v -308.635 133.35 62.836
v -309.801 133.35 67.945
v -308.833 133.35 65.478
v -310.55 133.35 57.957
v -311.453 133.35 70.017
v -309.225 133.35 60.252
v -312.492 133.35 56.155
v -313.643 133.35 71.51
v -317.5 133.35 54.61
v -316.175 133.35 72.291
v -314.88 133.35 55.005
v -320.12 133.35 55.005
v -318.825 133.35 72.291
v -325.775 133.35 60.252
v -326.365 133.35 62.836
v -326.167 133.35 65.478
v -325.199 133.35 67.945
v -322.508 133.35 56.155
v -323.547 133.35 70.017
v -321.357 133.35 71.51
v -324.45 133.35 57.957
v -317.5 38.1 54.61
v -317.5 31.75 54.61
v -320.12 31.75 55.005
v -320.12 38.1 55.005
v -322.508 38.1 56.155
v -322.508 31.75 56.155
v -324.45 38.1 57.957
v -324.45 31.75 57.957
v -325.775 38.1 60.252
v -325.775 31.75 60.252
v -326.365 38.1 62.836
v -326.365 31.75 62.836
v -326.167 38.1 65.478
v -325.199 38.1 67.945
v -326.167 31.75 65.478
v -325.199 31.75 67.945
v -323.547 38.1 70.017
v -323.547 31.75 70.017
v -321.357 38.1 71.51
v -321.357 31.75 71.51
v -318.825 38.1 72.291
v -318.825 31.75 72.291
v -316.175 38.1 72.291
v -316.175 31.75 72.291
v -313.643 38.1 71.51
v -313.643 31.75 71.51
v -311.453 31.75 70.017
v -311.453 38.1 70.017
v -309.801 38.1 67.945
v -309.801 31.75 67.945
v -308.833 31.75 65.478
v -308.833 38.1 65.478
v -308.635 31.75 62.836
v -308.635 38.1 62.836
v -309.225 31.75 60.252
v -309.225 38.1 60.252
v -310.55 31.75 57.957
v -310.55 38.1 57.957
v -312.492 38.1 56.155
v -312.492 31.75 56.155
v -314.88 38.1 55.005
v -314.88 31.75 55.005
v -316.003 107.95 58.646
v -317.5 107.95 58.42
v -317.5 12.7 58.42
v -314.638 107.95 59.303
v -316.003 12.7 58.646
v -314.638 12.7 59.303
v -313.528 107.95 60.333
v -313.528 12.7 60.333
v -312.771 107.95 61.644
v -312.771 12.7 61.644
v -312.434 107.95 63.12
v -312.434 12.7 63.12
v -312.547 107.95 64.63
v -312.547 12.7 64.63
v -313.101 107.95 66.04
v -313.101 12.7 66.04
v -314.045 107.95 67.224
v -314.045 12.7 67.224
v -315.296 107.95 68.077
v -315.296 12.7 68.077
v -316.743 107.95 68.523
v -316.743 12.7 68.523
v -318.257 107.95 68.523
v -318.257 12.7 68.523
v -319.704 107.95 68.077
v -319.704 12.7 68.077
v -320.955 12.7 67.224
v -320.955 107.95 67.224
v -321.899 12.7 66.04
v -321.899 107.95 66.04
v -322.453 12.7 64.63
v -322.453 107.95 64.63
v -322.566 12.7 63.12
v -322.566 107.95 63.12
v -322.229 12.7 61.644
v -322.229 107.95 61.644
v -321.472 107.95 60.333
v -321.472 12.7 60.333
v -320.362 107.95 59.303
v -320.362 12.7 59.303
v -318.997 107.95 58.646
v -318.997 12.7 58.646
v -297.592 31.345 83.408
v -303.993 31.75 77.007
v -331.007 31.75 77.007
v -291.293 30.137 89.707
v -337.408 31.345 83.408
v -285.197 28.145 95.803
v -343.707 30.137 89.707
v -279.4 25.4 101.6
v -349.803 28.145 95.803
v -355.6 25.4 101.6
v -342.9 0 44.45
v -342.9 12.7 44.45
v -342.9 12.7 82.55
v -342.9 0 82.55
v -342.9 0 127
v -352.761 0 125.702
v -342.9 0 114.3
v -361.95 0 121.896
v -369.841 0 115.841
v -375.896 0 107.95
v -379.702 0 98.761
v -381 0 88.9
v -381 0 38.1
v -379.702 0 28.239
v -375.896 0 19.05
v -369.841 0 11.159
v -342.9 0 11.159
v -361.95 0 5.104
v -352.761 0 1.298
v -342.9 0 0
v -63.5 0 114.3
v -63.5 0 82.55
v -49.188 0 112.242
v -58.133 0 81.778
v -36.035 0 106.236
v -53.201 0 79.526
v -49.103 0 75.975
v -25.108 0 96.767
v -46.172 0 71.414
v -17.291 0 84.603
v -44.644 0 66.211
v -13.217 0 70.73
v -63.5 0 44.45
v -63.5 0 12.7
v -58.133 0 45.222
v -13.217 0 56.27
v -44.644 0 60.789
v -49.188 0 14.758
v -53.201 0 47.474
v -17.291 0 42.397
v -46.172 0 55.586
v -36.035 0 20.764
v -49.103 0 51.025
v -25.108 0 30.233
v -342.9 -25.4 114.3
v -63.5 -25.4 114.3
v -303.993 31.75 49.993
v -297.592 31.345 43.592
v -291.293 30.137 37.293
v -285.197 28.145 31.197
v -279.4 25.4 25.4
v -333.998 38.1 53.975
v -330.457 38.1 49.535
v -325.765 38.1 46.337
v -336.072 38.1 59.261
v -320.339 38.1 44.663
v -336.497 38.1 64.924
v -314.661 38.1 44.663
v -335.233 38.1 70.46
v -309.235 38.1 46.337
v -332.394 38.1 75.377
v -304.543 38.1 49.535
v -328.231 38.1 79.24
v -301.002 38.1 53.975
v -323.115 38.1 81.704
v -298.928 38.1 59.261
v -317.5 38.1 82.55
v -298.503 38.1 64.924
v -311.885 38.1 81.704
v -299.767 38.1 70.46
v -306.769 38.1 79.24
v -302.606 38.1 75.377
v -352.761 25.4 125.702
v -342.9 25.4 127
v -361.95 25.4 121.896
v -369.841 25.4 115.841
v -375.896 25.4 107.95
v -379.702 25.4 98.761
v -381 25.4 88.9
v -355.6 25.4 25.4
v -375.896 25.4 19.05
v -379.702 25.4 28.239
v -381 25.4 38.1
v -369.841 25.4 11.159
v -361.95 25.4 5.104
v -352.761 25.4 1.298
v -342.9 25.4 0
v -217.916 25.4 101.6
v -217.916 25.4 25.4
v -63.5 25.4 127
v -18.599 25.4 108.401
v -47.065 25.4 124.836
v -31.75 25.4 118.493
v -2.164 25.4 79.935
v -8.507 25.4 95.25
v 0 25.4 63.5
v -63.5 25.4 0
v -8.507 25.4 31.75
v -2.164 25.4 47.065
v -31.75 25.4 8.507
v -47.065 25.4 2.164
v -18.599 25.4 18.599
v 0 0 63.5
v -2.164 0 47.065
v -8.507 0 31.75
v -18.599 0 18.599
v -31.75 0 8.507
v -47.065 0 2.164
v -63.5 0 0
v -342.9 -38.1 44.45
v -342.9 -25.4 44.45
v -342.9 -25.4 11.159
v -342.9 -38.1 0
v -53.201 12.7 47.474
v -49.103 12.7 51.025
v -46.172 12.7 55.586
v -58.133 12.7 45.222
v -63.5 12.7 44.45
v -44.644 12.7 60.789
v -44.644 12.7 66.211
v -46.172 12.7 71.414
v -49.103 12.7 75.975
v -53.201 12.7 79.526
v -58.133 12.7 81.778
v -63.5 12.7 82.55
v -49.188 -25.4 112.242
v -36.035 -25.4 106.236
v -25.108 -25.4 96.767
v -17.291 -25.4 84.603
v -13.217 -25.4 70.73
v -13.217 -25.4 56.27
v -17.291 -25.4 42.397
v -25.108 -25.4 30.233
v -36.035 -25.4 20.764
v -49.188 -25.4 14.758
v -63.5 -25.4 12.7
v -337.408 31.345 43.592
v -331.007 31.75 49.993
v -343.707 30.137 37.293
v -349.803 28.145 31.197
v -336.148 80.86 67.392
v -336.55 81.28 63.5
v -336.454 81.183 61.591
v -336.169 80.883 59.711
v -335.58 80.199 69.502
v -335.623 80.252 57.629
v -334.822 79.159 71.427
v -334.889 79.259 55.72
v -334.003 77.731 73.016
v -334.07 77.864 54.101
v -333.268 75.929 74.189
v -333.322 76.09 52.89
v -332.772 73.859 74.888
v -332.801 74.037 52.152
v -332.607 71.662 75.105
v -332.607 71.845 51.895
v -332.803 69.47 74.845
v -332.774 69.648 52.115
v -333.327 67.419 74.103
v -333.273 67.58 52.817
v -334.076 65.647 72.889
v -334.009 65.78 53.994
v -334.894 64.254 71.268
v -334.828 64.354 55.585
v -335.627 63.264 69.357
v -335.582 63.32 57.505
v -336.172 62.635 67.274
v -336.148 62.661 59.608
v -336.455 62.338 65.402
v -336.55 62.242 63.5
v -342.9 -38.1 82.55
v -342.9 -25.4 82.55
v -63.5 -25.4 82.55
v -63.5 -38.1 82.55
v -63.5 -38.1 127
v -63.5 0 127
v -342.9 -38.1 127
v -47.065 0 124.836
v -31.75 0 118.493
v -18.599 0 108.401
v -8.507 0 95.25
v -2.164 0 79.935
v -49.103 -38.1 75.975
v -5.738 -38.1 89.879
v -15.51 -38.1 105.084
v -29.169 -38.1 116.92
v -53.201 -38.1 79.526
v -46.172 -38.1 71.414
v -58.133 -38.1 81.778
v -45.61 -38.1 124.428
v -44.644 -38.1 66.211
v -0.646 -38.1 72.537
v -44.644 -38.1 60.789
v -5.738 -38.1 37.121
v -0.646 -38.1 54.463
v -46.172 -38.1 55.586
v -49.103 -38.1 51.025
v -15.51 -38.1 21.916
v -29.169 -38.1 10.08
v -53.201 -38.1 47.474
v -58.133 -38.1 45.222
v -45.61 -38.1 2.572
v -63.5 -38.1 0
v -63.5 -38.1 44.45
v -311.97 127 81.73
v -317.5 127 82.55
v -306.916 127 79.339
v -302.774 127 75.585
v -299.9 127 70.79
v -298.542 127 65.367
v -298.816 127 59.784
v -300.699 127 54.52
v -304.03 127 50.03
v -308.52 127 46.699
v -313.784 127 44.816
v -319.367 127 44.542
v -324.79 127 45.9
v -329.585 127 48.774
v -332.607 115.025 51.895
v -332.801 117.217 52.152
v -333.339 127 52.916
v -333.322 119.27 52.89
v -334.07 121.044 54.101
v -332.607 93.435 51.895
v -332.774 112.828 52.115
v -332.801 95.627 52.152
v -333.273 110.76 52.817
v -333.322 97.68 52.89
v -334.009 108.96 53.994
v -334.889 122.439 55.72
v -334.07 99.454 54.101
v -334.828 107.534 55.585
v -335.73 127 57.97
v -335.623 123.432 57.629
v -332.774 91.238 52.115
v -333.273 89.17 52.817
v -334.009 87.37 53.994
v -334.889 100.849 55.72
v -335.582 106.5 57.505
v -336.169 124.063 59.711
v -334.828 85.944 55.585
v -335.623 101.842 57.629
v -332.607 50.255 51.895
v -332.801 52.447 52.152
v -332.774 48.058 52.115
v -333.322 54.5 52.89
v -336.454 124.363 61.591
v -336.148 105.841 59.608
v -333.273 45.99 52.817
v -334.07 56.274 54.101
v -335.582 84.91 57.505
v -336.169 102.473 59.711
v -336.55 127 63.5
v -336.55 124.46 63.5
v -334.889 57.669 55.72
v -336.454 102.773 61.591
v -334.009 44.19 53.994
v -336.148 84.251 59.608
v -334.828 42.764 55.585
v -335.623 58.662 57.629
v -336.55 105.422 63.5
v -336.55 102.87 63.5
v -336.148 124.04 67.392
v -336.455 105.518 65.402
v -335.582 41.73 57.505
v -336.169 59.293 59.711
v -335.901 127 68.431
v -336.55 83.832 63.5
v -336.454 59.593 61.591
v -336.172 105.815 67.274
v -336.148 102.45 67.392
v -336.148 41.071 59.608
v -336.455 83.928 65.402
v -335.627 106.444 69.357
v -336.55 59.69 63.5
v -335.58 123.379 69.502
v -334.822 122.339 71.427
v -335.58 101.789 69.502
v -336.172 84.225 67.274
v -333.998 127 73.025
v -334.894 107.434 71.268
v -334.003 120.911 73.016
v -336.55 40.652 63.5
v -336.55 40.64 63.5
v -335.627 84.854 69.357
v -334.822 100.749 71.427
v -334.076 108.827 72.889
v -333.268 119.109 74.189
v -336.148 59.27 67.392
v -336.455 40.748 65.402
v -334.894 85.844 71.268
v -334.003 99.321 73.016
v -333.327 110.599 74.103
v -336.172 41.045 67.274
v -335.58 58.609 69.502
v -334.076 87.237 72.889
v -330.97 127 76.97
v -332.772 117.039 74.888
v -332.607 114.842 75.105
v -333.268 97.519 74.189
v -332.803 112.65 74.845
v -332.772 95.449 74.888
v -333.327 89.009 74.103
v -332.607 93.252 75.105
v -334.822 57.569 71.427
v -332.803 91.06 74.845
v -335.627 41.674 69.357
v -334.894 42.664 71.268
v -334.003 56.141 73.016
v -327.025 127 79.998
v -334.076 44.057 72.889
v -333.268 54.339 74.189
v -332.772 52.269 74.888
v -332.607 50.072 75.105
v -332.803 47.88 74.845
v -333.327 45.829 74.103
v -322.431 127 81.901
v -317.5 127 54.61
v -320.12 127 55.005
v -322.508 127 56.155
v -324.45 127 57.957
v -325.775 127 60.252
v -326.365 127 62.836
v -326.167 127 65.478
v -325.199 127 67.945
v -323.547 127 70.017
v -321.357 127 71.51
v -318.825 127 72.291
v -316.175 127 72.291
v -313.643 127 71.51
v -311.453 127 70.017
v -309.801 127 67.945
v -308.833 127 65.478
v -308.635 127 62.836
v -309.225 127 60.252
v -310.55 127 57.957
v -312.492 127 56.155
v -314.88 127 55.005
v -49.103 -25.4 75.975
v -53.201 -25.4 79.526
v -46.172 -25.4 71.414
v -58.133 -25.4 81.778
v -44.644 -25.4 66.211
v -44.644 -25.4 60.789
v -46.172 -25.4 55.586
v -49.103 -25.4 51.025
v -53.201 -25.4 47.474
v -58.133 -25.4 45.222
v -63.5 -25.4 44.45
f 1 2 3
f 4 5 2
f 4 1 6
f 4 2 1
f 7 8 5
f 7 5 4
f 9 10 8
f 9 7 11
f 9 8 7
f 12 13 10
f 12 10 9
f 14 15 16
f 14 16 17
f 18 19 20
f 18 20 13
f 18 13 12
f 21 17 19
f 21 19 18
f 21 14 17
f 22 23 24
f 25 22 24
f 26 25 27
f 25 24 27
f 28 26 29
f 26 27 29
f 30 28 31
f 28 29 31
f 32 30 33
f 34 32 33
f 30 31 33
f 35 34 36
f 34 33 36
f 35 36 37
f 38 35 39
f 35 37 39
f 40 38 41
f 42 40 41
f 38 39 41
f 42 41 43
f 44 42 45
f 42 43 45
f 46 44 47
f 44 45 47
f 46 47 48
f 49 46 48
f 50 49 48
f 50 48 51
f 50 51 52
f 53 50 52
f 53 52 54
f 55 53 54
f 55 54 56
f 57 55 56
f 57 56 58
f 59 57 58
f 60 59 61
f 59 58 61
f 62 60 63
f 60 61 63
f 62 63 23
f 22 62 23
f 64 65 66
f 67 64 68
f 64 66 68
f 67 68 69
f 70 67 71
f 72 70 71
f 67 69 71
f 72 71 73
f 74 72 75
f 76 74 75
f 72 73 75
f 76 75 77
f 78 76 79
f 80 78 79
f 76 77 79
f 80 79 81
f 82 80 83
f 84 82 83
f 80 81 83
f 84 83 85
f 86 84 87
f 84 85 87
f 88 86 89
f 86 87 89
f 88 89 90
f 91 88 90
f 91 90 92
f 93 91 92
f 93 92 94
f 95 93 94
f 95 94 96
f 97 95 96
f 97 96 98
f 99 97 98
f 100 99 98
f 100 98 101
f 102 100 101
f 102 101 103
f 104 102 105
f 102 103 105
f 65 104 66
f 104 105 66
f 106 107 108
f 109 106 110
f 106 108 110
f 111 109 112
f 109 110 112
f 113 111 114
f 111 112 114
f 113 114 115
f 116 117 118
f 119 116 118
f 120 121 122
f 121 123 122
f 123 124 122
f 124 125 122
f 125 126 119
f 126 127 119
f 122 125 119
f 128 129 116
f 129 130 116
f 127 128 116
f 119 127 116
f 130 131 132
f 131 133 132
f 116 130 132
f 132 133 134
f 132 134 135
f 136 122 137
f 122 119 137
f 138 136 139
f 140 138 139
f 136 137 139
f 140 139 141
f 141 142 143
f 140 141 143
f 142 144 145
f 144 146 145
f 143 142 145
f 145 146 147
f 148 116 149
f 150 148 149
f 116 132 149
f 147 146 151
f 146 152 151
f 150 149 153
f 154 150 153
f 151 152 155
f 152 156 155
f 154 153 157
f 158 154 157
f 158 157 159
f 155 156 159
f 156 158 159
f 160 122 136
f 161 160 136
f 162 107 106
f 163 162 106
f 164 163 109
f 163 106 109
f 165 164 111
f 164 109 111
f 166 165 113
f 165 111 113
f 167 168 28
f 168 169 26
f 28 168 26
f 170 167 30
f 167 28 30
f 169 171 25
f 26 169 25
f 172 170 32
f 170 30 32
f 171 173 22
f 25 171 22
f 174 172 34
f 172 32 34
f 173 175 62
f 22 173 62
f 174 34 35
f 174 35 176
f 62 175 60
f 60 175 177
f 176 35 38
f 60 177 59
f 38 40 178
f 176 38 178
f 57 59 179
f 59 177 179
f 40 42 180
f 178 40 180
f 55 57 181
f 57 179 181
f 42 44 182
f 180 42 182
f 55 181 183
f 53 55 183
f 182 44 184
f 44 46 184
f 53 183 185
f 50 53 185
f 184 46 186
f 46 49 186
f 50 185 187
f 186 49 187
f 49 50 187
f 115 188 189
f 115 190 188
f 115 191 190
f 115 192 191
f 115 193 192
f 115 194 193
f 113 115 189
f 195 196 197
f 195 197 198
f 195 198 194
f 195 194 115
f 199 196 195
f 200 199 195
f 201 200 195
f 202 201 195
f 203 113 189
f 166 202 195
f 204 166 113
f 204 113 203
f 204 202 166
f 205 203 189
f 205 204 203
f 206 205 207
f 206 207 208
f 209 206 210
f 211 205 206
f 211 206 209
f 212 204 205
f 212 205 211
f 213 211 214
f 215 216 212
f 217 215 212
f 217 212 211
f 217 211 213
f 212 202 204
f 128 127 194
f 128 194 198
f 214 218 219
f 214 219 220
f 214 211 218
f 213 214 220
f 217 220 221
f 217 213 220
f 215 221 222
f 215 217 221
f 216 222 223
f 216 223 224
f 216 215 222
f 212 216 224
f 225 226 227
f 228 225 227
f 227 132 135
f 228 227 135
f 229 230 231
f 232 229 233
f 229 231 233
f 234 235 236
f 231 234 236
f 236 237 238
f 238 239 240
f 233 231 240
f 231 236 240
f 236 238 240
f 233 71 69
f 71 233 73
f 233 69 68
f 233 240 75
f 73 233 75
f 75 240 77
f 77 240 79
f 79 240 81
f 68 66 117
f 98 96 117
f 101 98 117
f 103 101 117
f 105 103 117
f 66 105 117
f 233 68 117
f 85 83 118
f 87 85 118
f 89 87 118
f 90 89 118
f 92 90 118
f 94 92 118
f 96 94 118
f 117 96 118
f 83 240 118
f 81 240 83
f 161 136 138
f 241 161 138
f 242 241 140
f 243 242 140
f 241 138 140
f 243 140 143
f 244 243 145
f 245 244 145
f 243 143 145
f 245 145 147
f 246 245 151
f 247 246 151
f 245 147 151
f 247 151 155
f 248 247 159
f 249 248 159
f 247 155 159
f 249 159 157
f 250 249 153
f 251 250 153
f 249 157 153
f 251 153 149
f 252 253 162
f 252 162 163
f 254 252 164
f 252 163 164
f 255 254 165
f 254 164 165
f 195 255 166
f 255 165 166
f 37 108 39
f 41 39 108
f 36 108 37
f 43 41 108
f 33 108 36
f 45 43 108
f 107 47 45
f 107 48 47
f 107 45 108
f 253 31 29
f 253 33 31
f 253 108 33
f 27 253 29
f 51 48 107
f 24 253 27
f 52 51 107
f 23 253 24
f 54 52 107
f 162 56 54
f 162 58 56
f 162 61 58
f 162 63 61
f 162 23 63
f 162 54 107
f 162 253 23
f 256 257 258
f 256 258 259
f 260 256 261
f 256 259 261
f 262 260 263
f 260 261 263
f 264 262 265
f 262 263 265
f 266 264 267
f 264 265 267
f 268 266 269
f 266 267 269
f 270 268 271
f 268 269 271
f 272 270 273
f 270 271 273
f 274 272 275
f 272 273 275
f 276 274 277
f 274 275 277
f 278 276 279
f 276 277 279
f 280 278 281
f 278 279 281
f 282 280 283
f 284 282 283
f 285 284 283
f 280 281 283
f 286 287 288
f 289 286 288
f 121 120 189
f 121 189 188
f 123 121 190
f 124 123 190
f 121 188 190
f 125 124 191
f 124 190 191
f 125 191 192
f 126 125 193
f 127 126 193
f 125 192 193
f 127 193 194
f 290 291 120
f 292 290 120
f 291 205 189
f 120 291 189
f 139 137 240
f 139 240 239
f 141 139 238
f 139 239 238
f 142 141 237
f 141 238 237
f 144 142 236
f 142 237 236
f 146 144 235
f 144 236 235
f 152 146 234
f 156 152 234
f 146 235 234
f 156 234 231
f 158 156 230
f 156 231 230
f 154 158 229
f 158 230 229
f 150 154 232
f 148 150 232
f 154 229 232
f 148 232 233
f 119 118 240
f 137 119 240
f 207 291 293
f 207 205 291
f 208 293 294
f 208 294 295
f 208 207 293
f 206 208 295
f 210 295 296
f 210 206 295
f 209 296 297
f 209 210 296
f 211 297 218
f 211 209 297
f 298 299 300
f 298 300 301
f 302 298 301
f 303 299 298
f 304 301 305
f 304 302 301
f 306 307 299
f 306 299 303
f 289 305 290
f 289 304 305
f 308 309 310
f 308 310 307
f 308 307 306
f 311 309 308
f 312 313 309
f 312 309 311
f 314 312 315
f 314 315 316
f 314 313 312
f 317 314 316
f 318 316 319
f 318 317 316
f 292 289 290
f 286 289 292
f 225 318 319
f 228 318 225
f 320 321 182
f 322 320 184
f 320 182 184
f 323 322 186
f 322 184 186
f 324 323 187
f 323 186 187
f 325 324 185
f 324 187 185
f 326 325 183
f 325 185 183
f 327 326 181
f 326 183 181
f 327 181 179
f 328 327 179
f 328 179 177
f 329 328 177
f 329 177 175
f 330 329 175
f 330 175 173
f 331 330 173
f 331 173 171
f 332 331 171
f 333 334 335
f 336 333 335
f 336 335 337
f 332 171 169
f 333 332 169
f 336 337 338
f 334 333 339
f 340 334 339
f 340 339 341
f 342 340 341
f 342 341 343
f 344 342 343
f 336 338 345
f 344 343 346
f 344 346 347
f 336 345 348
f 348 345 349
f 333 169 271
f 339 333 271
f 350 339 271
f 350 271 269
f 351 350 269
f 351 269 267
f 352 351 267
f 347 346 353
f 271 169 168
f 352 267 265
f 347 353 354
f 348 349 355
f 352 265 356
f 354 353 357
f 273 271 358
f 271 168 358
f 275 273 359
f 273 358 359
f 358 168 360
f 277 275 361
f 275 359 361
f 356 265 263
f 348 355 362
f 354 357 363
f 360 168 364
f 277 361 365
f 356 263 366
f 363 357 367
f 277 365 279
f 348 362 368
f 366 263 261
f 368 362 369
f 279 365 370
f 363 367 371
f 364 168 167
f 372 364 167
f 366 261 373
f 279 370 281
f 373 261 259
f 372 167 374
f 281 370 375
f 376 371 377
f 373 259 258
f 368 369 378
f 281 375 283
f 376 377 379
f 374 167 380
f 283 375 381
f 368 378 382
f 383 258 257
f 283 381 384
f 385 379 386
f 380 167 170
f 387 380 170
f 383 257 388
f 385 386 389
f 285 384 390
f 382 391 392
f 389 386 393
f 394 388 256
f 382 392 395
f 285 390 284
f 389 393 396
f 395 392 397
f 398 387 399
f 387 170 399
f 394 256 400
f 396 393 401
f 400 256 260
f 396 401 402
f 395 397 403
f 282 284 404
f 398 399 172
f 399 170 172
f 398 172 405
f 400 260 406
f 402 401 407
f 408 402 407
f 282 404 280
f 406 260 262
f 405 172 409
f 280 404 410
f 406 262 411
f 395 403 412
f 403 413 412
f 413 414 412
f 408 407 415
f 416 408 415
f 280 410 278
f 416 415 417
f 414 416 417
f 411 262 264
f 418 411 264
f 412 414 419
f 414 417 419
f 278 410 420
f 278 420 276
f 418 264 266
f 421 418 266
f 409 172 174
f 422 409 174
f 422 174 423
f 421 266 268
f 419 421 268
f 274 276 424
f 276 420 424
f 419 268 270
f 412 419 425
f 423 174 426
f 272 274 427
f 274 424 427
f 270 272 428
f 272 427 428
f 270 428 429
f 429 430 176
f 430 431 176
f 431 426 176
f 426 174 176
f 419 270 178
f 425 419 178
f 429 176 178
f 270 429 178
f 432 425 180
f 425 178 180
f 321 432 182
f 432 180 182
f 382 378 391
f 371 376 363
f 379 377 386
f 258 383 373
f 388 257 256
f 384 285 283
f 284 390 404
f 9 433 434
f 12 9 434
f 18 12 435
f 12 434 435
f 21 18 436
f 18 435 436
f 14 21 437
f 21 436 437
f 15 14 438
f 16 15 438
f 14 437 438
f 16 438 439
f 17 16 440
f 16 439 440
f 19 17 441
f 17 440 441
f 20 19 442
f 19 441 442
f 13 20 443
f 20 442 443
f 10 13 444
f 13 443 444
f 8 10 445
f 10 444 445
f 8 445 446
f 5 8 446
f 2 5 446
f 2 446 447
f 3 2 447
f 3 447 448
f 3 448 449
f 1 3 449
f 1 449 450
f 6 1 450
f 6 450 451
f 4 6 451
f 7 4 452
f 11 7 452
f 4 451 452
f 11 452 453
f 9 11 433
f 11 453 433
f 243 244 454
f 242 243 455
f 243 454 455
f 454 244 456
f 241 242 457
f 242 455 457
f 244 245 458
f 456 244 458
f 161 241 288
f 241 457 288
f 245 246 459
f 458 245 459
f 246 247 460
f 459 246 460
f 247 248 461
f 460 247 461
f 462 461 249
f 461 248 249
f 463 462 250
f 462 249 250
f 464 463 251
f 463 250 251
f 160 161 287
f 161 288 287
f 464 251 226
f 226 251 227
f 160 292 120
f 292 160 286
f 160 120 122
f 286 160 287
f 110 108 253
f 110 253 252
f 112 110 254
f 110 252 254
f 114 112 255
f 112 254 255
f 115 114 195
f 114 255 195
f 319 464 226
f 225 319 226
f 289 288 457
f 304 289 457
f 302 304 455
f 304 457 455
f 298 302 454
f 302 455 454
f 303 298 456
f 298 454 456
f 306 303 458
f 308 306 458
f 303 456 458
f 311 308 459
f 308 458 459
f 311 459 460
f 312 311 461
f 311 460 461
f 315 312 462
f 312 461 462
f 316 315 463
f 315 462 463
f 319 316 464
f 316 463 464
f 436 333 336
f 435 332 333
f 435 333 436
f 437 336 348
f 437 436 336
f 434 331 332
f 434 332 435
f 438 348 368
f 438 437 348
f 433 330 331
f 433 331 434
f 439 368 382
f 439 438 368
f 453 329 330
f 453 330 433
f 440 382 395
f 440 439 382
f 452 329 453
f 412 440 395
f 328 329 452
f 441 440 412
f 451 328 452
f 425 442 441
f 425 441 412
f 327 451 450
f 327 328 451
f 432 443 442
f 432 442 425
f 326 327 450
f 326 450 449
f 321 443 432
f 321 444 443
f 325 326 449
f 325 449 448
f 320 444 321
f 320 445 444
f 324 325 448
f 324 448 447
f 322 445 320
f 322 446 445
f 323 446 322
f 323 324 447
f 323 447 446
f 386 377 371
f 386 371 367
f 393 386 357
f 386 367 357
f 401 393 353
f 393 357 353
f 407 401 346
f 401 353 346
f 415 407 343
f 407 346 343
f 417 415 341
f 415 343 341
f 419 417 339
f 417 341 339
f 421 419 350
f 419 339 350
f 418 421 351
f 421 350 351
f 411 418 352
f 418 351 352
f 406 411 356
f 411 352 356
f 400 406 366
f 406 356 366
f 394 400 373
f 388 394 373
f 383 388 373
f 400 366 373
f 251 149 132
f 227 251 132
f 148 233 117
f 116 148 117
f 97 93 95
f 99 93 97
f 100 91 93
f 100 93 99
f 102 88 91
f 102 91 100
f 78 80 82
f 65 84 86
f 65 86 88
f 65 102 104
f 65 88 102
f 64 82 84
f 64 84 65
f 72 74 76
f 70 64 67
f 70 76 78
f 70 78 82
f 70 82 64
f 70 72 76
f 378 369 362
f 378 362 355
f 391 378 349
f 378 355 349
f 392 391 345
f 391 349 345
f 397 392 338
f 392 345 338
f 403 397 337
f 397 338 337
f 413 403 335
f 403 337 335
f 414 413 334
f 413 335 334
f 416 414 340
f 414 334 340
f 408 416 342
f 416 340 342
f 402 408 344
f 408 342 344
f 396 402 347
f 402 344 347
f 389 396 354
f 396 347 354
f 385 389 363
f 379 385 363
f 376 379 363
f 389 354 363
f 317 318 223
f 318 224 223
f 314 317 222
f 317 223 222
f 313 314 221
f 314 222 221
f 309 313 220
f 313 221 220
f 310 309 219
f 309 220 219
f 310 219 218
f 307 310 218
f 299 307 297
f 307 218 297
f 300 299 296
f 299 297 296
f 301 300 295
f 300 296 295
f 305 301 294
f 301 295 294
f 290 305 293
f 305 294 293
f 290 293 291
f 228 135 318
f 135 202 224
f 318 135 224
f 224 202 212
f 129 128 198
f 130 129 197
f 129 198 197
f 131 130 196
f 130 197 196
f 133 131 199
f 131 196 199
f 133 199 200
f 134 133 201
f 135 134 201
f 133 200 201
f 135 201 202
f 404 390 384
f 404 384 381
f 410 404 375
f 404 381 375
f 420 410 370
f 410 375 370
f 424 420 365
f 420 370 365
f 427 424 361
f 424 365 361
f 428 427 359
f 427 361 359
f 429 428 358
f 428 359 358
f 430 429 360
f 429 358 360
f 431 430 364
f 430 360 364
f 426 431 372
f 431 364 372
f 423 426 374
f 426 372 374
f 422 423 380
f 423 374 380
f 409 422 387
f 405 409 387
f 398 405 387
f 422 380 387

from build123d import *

# Parameters (mm, degrees)
SKETCH1_W           = 381
SKETCH1_H           = 127
BOSS_EXTRUDE1_DEPTH = 25.4
FILLET1_R           = 63.5
FILLET2_R           = 38.1
BOSS_EXTRUDE2_DEPTH = 25.4
BOSS_EXTRUDE3_DEPTH = 12.7
SKETCH4_W           = 76.2
SKETCH4_H           = 76.2
BOSS_EXTRUDE4_DEPTH = 6.35
FILLET3_R           = 50.8
SKETCH5_R           = 8.89
BOSS_EXTRUDE5_DEPTH = 6.35
SKETCH6_R           = 19.05
BOSS_EXTRUDE6_DEPTH = 88.9
CUT_EXTRUDE1_DEPTH  = 88.9
SKETCH8_R           = 8.89
BOSS_EXTRUDE7_DEPTH = 6.35
CUT_EXTRUDE2_START  = -12.7
CUT_EXTRUDE2_DEPTH  = 12.7
SKETCH10_R          = 5.08
CUT_EXTRUDE3_DEPTH  = 95.25


# Some blends are built 0.0001 mm under size
with BuildPart() as part:
    # Sketch1 → Boss-Extrude1 (new body)
    with BuildSketch(Plane(origin=(0, 0, 0), x_dir=(1, 0, 0), z_dir=(0, 1, 0))):
        with Locations((-190.5, -63.5)):
            Rectangle(SKETCH1_W, SKETCH1_H)
    extrude(amount=BOSS_EXTRUDE1_DEPTH)

    # Fillet1
    fillet1_edges = [part.edges().sort_by_distance(p)[0] for p in [
        (0, 12.7, 0),
        (0, 12.7, 127),
    ]]
    fillet(fillet1_edges, radius=FILLET1_R - 0.0001)  # a hair under: the kernel refuses the full size

    # Fillet2
    fillet2_edges = [part.edges().sort_by_distance(p)[0] for p in [
        (-381, 12.7, 127),
        (-381, 12.7, 0),
    ]]
    fillet(fillet2_edges, radius=FILLET2_R)

    # Sketch2 → Boss-Extrude2 (add)
    with BuildSketch(Plane(origin=(0, 0, 0), x_dir=(1, 0, 0), z_dir=(0, 1, 0))):
        with BuildLine():
            Line((-63.5, -12.7), (-342.9, -11.159231637))
            Line((-342.9, -11.159231637), (-342.9, 0))
            Line((-342.9, 0), (-63.5, 0))
            ThreePointArc((-63.5, 0), (0, -63.5), (-63.5, -127))
            Line((-63.5, -127), (-342.9, -127))
            Line((-342.9, -127), (-342.9, -114.3))
            Line((-342.9, -114.3), (-63.5, -114.3))
            ThreePointArc((-63.5, -114.3), (-12.7, -63.5), (-63.5, -12.7))
        make_face()
    extrude(amount=-BOSS_EXTRUDE2_DEPTH)

    # Sketch3 → Boss-Extrude3 (add)
    with BuildSketch(Plane(origin=(0, -25.4, 0), x_dir=(1, 0, 0), z_dir=(0, 1, 0))):
        with BuildLine():
            Line((-342.9, -127), (-342.9, -82.55))
            Line((-342.9, -82.55), (-63.5, -82.55))
            ThreePointArc((-63.5, -82.55), (-44.45, -63.5), (-63.5, -44.45))
            Line((-63.5, -44.45), (-342.9, -44.45))
            Line((-342.9, -44.45), (-342.9, 0))
            Line((-342.9, 0), (-63.5, 0))
            ThreePointArc((-63.5, 0), (0, -63.5), (-63.5, -127))
            Line((-63.5, -127), (-342.9, -127))
        make_face()
    extrude(amount=-BOSS_EXTRUDE3_DEPTH)

    # Sketch4 → Boss-Extrude4 (add)
    with BuildSketch(Plane(origin=(0, 25.4, 0), x_dir=(1, 0, 0), z_dir=(0, 1, 0))):
        with Locations((-317.5, -63.5)):
            Rectangle(SKETCH4_W, SKETCH4_H)
    extrude(amount=BOSS_EXTRUDE4_DEPTH)

    # Fillet3
    # the kernel refuses this fillet: 50.8 mm, written as the material it takes off along each edge
    with BuildSketch(Plane(origin=(-279.4, 31.75, 163.083610621), x_dir=(0, -1, 0), z_dir=(0, 0, -1)), Plane(origin=(-417.083610621, 31.75, 101.6), x_dir=(0, -1, 0), z_dir=(1, 0, 0)), Plane(origin=(-355.6, 31.75, -36.083610621), x_dir=(0, -1, 0), z_dir=(0, 0, 1)), Plane(origin=(-217.916389379, 31.75, 25.4), x_dir=(0, -1, 0), z_dir=(-1, 0, 0))) as fillet3_piece_1:
        with BuildLine():
            CenterArc((50.8, 24.593444248), FILLET3_R, 180, 28.955024372)
            Line((0, 24.593444248), (-1.016, 24.593444248))
            Line((-1.016, 24.593444248), (-1.016, 0))
            Line((-1.016, 0), (0, -1.016))
            ThreePointArc((0, -1.016), (3.175, -1.016), (5.461, -0.491868885))
            Line((5.461, -0.491868885), (6.35, 0))
        make_face()
    extrude(amount=199.167221242, mode=Mode.SUBTRACT)

    # Sketch5 → Boss-Extrude5 (add)
    with BuildSketch(Plane(origin=(0, 31.75, 0), x_dir=(1, 0, 0), z_dir=(0, 1, 0))):
        with Locations(Location((-317.5, -63.5, 0), (0, 0, 90))):
            Circle(SKETCH5_R)
    extrude(amount=BOSS_EXTRUDE5_DEPTH)

    # Sketch6 → Boss-Extrude6 (add)
    with BuildSketch(Plane(origin=(0, 38.1, 0), x_dir=(1, 0, 0), z_dir=(0, 1, 0))):
        with Locations(Location((-317.5, -63.5, 0), (0, 0, 270))):
            Circle(SKETCH6_R)
    extrude(amount=BOSS_EXTRUDE6_DEPTH)

    # Sketch7 → Cut-Extrude1 (cut)
    with BuildSketch(Plane.XY):
        with BuildLine():
            Line((-336.55, 127), (-336.55, 124.46))
            ThreePointArc((-336.55, 124.46), (-332.607071488, 114.940928512), (-336.55, 105.421857023))
            Line((-336.55, 105.421857023), (-336.55, 105.41))
            Line((-336.55, 105.41), (-336.55, 102.87))
            ThreePointArc((-336.55, 102.87), (-332.607071488, 93.350928512), (-336.55, 83.831857023))
            Line((-336.55, 83.831857023), (-336.55, 83.82))
            Line((-336.55, 83.82), (-336.55, 81.28))
            ThreePointArc((-336.55, 81.28), (-332.607071488, 71.760928512), (-336.55, 62.241857023))
            Line((-336.55, 62.241857023), (-336.55, 62.23))
            Line((-336.55, 62.23), (-336.55, 59.69))
            ThreePointArc((-336.55, 59.69), (-332.607071488, 50.170928512), (-336.55, 40.651857023))
            Line((-336.55, 40.651857023), (-336.55, 40.64))
            Line((-336.55, 40.64), (-368.013875858, 40.64))
            Line((-368.013875858, 40.64), (-368.013875858, 127.710007378))
            Line((-368.013875858, 127.710007378), (-336.55, 127))
        make_face()
    extrude(amount=CUT_EXTRUDE1_DEPTH, mode=Mode.SUBTRACT)

    # Sketch8 → Boss-Extrude7 (add)
    with BuildSketch(Plane(origin=(0, 127, 0), x_dir=(1, 0, 0), z_dir=(0, 1, 0))):
        with Locations(Location((-317.5, -63.5, 0), (0, 0, 90))):
            Circle(SKETCH8_R)
    extrude(amount=BOSS_EXTRUDE7_DEPTH)

    # Sketch9 → Cut-Extrude2 (cut)
    with BuildSketch(Plane.XZ.offset(CUT_EXTRUDE2_START)):
        with BuildLine():
            Line((-342.9, 82.55), (-63.5, 82.55))
            ThreePointArc((-63.5, 82.55), (-44.45, 63.5), (-63.5, 44.45))
            Line((-63.5, 44.45), (-342.9, 44.45))
            Line((-342.9, 44.45), (-342.9, 82.55))
        make_face()
    extrude(amount=CUT_EXTRUDE2_DEPTH, mode=Mode.SUBTRACT)

    # Sketch10 → Cut-Extrude3 (cut)
    with BuildSketch(Plane.XZ.offset(-12.7)):
        with Locations(Location((-317.5, 63.5, 0), (0, 0, 270))):
            Circle(SKETCH10_R)
    extrude(amount=-CUT_EXTRUDE3_DEPTH, mode=Mode.SUBTRACT)


solid = part.part
